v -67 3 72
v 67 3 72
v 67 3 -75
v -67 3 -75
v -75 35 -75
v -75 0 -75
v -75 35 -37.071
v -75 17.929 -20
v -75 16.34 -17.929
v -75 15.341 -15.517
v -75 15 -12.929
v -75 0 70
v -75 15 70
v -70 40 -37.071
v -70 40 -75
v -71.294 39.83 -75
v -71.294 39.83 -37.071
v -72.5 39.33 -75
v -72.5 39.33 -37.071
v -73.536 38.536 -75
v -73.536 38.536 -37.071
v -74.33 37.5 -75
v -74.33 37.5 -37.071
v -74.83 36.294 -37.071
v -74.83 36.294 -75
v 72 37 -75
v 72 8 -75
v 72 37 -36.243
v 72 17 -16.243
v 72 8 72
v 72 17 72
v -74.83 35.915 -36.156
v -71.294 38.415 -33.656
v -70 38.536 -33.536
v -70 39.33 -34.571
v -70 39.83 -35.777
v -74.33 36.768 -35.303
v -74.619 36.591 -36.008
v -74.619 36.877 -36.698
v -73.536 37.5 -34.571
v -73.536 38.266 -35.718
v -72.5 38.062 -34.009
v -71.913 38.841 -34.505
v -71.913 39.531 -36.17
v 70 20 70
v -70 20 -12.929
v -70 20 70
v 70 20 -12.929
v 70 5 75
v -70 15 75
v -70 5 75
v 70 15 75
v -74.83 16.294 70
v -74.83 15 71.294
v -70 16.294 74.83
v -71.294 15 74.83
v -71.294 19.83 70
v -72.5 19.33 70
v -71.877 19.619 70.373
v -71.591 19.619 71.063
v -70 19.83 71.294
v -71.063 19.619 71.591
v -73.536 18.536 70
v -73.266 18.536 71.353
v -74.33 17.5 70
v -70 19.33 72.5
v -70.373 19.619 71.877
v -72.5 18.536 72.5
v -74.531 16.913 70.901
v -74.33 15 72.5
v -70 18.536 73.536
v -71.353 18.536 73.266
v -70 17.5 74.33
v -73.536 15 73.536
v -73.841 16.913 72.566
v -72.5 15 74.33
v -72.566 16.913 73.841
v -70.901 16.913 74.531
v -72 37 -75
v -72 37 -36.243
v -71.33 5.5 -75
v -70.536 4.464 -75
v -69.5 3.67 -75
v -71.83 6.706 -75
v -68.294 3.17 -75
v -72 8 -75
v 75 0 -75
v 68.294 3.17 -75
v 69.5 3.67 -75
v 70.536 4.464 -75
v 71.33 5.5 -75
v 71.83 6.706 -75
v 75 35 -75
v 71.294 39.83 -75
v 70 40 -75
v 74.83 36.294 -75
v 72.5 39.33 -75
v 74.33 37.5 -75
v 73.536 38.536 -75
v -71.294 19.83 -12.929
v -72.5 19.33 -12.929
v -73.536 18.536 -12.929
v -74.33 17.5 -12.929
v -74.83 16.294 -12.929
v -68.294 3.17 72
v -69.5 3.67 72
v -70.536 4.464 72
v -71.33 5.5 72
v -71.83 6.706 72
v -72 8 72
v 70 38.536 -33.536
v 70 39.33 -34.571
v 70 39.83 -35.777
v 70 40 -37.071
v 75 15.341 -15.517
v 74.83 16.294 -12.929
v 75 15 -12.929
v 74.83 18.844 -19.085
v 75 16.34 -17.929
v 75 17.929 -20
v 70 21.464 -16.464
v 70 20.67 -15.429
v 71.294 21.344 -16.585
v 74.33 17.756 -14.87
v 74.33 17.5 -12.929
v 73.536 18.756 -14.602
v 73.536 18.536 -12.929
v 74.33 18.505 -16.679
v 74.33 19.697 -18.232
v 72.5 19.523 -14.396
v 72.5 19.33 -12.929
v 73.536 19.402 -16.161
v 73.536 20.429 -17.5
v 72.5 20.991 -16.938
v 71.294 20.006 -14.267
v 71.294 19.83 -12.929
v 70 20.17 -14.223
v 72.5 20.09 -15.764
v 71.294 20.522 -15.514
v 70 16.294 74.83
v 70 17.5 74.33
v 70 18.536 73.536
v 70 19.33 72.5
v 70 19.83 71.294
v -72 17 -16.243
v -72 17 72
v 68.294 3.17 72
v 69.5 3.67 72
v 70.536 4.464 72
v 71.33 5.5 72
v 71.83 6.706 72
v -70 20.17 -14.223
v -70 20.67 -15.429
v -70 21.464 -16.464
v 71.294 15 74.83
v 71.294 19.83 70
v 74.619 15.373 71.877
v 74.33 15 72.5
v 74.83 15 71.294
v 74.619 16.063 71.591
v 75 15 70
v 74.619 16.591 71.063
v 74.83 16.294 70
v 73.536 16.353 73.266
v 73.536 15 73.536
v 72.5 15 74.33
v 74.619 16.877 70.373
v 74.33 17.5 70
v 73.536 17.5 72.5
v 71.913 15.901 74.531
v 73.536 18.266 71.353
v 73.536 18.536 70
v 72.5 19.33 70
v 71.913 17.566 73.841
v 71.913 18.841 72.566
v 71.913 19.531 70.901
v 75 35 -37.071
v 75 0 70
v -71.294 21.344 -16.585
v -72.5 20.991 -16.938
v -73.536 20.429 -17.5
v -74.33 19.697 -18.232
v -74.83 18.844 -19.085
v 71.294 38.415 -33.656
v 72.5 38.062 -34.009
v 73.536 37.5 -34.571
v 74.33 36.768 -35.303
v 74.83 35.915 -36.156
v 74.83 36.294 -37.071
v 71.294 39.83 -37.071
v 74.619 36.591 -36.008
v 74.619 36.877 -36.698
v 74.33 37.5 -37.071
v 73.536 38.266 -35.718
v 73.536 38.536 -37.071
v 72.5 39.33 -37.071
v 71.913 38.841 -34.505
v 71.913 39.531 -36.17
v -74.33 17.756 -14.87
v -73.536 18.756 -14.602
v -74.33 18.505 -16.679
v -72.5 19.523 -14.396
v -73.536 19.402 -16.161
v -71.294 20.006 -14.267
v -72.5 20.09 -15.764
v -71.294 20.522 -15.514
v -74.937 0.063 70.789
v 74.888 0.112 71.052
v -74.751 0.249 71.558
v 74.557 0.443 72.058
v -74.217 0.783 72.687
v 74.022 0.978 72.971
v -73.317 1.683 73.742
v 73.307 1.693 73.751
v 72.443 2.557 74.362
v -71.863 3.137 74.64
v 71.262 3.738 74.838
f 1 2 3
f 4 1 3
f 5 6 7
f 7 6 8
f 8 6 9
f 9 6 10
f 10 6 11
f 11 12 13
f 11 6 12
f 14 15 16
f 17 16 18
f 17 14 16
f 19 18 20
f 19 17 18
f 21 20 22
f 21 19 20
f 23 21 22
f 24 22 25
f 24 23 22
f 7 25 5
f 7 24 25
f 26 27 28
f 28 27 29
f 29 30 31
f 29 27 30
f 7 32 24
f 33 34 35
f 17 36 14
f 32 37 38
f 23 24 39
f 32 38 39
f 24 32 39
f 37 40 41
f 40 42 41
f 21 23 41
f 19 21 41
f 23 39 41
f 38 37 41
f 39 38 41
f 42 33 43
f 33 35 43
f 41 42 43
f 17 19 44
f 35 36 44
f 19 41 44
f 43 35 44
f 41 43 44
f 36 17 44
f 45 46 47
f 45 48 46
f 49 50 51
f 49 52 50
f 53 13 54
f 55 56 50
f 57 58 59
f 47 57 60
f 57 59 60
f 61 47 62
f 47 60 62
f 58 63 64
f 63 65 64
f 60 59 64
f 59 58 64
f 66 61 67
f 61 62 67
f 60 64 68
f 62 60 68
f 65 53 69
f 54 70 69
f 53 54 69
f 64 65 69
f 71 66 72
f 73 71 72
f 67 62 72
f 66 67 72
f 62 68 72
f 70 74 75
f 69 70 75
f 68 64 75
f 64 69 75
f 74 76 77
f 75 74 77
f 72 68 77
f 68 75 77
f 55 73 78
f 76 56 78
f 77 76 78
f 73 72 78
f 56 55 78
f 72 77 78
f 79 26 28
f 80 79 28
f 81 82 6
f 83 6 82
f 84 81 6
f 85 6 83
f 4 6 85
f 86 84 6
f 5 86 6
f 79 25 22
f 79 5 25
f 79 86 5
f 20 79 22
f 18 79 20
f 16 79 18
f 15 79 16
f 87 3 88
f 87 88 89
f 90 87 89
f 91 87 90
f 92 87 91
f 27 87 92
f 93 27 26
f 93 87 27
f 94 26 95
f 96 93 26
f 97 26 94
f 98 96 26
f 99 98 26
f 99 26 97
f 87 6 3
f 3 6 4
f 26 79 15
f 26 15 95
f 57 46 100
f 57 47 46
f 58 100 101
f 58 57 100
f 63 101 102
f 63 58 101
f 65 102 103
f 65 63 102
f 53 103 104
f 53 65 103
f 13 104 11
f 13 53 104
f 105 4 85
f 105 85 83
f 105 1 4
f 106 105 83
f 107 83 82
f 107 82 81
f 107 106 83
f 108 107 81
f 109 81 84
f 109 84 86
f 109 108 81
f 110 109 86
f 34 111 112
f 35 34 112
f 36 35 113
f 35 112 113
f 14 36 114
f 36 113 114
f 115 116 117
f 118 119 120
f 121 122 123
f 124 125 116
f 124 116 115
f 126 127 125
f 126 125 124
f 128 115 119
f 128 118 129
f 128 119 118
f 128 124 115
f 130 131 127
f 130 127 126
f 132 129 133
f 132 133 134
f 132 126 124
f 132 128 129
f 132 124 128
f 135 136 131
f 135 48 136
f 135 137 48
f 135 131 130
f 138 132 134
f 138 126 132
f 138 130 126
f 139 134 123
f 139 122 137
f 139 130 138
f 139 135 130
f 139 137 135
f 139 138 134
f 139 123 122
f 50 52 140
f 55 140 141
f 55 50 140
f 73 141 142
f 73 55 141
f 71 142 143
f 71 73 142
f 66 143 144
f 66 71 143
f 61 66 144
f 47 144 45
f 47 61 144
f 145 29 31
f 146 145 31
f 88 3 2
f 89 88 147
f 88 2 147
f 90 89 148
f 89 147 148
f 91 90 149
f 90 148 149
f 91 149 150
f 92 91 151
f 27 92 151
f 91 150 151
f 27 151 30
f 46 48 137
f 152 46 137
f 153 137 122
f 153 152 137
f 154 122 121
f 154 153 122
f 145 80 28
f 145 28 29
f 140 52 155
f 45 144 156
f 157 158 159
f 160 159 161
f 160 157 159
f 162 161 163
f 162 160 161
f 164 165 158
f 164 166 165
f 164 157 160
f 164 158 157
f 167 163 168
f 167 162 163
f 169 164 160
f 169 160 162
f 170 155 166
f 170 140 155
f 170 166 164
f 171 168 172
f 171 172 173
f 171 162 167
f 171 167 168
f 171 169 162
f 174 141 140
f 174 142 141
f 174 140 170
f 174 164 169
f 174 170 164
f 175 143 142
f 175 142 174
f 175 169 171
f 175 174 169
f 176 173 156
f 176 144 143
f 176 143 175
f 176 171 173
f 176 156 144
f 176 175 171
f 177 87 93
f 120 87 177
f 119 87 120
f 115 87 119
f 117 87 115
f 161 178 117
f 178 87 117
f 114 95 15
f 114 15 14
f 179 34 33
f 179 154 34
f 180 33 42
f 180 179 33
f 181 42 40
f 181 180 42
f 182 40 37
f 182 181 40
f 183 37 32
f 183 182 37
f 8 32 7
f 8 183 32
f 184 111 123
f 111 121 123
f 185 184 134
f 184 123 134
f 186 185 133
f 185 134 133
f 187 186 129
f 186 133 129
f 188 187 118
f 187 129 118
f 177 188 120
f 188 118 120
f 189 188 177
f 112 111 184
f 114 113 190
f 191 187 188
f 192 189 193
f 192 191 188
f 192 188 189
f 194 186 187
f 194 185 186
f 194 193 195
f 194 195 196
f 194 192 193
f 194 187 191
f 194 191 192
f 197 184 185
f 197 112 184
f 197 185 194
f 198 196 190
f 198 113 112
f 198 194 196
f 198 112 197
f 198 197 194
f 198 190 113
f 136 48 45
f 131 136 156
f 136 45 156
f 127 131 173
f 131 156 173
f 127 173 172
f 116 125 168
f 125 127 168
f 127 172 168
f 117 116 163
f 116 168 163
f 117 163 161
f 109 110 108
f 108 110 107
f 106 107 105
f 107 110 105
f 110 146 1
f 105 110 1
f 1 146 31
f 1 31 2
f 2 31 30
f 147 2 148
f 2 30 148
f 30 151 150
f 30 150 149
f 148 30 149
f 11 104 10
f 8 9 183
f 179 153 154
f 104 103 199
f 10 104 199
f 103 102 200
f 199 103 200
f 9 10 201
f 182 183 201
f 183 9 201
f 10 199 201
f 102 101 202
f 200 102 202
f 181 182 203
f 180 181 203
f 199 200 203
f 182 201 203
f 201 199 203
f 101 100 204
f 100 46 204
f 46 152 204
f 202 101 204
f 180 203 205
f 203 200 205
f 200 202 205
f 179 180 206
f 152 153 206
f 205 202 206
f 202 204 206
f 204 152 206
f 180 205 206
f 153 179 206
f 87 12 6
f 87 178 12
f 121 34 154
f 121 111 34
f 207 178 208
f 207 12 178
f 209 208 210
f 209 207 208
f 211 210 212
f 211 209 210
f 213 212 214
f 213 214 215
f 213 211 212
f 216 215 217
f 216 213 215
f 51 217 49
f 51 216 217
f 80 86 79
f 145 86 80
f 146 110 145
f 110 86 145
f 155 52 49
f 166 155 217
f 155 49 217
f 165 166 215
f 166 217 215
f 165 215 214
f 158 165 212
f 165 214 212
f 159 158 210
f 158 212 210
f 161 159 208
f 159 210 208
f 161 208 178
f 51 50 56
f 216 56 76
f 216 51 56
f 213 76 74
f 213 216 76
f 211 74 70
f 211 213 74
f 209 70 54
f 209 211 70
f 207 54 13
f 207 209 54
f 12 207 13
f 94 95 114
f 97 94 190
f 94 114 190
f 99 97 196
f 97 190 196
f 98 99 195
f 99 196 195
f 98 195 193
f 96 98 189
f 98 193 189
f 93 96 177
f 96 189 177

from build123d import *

# Parameters (mm, degrees)
F3_DEPTH = 75
F4_T     = -3
F5_R     = 5


with BuildPart() as f3:
    # F2 (on Right) → F3 (new body, symmetric)
    with BuildSketch(Plane.YZ):
        Polygon((0, 75), (0, 0), (0, -75), (40, -75), (40, -35), (20, -15), (20, 75), align=None)
    extrude(amount=F3_DEPTH, both=True)

    # F4
    f4_openings = [f3.faces().sort_by_distance(p)[0] for p in [
        (0, 20, -75),
    ]]
    offset(amount=F4_T, openings=f4_openings, kind=Kind.INTERSECTION)

    # F5
    f5_edges = [f3.edges().sort_by_distance(p)[0] for p in [
        (72, 3, -1.5),
        (-72, 3, -1.5),
        (-75, 10, 75),
        (-75, 20, 30),
        (-75, 30, -25),
        (-75, 40, -55),
        (0, 20, 75),
        (0, 0, 75),
        (75, 10, 75),
        (75, 20, 30),
        (75, 30, -25),
        (75, 40, -55),
        (0, 40, -35),
        (0, 20, -15),
    ]]
    fillet(f5_edges, radius=F5_R)


solid = f3.part
